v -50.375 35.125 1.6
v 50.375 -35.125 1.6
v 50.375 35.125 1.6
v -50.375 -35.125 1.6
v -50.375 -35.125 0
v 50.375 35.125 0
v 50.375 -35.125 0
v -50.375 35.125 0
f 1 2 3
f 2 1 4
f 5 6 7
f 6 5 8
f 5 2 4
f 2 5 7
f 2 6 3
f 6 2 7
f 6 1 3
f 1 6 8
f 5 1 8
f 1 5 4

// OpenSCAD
$fn = 64;

board_x = 100.75;
board_y = 70.25;
board_th = 1.6;

color([0.05, 0.45, 0.18])
translate([-board_x/2, -board_y/2, 0])
cube([board_x, board_y, board_th], center=false);
